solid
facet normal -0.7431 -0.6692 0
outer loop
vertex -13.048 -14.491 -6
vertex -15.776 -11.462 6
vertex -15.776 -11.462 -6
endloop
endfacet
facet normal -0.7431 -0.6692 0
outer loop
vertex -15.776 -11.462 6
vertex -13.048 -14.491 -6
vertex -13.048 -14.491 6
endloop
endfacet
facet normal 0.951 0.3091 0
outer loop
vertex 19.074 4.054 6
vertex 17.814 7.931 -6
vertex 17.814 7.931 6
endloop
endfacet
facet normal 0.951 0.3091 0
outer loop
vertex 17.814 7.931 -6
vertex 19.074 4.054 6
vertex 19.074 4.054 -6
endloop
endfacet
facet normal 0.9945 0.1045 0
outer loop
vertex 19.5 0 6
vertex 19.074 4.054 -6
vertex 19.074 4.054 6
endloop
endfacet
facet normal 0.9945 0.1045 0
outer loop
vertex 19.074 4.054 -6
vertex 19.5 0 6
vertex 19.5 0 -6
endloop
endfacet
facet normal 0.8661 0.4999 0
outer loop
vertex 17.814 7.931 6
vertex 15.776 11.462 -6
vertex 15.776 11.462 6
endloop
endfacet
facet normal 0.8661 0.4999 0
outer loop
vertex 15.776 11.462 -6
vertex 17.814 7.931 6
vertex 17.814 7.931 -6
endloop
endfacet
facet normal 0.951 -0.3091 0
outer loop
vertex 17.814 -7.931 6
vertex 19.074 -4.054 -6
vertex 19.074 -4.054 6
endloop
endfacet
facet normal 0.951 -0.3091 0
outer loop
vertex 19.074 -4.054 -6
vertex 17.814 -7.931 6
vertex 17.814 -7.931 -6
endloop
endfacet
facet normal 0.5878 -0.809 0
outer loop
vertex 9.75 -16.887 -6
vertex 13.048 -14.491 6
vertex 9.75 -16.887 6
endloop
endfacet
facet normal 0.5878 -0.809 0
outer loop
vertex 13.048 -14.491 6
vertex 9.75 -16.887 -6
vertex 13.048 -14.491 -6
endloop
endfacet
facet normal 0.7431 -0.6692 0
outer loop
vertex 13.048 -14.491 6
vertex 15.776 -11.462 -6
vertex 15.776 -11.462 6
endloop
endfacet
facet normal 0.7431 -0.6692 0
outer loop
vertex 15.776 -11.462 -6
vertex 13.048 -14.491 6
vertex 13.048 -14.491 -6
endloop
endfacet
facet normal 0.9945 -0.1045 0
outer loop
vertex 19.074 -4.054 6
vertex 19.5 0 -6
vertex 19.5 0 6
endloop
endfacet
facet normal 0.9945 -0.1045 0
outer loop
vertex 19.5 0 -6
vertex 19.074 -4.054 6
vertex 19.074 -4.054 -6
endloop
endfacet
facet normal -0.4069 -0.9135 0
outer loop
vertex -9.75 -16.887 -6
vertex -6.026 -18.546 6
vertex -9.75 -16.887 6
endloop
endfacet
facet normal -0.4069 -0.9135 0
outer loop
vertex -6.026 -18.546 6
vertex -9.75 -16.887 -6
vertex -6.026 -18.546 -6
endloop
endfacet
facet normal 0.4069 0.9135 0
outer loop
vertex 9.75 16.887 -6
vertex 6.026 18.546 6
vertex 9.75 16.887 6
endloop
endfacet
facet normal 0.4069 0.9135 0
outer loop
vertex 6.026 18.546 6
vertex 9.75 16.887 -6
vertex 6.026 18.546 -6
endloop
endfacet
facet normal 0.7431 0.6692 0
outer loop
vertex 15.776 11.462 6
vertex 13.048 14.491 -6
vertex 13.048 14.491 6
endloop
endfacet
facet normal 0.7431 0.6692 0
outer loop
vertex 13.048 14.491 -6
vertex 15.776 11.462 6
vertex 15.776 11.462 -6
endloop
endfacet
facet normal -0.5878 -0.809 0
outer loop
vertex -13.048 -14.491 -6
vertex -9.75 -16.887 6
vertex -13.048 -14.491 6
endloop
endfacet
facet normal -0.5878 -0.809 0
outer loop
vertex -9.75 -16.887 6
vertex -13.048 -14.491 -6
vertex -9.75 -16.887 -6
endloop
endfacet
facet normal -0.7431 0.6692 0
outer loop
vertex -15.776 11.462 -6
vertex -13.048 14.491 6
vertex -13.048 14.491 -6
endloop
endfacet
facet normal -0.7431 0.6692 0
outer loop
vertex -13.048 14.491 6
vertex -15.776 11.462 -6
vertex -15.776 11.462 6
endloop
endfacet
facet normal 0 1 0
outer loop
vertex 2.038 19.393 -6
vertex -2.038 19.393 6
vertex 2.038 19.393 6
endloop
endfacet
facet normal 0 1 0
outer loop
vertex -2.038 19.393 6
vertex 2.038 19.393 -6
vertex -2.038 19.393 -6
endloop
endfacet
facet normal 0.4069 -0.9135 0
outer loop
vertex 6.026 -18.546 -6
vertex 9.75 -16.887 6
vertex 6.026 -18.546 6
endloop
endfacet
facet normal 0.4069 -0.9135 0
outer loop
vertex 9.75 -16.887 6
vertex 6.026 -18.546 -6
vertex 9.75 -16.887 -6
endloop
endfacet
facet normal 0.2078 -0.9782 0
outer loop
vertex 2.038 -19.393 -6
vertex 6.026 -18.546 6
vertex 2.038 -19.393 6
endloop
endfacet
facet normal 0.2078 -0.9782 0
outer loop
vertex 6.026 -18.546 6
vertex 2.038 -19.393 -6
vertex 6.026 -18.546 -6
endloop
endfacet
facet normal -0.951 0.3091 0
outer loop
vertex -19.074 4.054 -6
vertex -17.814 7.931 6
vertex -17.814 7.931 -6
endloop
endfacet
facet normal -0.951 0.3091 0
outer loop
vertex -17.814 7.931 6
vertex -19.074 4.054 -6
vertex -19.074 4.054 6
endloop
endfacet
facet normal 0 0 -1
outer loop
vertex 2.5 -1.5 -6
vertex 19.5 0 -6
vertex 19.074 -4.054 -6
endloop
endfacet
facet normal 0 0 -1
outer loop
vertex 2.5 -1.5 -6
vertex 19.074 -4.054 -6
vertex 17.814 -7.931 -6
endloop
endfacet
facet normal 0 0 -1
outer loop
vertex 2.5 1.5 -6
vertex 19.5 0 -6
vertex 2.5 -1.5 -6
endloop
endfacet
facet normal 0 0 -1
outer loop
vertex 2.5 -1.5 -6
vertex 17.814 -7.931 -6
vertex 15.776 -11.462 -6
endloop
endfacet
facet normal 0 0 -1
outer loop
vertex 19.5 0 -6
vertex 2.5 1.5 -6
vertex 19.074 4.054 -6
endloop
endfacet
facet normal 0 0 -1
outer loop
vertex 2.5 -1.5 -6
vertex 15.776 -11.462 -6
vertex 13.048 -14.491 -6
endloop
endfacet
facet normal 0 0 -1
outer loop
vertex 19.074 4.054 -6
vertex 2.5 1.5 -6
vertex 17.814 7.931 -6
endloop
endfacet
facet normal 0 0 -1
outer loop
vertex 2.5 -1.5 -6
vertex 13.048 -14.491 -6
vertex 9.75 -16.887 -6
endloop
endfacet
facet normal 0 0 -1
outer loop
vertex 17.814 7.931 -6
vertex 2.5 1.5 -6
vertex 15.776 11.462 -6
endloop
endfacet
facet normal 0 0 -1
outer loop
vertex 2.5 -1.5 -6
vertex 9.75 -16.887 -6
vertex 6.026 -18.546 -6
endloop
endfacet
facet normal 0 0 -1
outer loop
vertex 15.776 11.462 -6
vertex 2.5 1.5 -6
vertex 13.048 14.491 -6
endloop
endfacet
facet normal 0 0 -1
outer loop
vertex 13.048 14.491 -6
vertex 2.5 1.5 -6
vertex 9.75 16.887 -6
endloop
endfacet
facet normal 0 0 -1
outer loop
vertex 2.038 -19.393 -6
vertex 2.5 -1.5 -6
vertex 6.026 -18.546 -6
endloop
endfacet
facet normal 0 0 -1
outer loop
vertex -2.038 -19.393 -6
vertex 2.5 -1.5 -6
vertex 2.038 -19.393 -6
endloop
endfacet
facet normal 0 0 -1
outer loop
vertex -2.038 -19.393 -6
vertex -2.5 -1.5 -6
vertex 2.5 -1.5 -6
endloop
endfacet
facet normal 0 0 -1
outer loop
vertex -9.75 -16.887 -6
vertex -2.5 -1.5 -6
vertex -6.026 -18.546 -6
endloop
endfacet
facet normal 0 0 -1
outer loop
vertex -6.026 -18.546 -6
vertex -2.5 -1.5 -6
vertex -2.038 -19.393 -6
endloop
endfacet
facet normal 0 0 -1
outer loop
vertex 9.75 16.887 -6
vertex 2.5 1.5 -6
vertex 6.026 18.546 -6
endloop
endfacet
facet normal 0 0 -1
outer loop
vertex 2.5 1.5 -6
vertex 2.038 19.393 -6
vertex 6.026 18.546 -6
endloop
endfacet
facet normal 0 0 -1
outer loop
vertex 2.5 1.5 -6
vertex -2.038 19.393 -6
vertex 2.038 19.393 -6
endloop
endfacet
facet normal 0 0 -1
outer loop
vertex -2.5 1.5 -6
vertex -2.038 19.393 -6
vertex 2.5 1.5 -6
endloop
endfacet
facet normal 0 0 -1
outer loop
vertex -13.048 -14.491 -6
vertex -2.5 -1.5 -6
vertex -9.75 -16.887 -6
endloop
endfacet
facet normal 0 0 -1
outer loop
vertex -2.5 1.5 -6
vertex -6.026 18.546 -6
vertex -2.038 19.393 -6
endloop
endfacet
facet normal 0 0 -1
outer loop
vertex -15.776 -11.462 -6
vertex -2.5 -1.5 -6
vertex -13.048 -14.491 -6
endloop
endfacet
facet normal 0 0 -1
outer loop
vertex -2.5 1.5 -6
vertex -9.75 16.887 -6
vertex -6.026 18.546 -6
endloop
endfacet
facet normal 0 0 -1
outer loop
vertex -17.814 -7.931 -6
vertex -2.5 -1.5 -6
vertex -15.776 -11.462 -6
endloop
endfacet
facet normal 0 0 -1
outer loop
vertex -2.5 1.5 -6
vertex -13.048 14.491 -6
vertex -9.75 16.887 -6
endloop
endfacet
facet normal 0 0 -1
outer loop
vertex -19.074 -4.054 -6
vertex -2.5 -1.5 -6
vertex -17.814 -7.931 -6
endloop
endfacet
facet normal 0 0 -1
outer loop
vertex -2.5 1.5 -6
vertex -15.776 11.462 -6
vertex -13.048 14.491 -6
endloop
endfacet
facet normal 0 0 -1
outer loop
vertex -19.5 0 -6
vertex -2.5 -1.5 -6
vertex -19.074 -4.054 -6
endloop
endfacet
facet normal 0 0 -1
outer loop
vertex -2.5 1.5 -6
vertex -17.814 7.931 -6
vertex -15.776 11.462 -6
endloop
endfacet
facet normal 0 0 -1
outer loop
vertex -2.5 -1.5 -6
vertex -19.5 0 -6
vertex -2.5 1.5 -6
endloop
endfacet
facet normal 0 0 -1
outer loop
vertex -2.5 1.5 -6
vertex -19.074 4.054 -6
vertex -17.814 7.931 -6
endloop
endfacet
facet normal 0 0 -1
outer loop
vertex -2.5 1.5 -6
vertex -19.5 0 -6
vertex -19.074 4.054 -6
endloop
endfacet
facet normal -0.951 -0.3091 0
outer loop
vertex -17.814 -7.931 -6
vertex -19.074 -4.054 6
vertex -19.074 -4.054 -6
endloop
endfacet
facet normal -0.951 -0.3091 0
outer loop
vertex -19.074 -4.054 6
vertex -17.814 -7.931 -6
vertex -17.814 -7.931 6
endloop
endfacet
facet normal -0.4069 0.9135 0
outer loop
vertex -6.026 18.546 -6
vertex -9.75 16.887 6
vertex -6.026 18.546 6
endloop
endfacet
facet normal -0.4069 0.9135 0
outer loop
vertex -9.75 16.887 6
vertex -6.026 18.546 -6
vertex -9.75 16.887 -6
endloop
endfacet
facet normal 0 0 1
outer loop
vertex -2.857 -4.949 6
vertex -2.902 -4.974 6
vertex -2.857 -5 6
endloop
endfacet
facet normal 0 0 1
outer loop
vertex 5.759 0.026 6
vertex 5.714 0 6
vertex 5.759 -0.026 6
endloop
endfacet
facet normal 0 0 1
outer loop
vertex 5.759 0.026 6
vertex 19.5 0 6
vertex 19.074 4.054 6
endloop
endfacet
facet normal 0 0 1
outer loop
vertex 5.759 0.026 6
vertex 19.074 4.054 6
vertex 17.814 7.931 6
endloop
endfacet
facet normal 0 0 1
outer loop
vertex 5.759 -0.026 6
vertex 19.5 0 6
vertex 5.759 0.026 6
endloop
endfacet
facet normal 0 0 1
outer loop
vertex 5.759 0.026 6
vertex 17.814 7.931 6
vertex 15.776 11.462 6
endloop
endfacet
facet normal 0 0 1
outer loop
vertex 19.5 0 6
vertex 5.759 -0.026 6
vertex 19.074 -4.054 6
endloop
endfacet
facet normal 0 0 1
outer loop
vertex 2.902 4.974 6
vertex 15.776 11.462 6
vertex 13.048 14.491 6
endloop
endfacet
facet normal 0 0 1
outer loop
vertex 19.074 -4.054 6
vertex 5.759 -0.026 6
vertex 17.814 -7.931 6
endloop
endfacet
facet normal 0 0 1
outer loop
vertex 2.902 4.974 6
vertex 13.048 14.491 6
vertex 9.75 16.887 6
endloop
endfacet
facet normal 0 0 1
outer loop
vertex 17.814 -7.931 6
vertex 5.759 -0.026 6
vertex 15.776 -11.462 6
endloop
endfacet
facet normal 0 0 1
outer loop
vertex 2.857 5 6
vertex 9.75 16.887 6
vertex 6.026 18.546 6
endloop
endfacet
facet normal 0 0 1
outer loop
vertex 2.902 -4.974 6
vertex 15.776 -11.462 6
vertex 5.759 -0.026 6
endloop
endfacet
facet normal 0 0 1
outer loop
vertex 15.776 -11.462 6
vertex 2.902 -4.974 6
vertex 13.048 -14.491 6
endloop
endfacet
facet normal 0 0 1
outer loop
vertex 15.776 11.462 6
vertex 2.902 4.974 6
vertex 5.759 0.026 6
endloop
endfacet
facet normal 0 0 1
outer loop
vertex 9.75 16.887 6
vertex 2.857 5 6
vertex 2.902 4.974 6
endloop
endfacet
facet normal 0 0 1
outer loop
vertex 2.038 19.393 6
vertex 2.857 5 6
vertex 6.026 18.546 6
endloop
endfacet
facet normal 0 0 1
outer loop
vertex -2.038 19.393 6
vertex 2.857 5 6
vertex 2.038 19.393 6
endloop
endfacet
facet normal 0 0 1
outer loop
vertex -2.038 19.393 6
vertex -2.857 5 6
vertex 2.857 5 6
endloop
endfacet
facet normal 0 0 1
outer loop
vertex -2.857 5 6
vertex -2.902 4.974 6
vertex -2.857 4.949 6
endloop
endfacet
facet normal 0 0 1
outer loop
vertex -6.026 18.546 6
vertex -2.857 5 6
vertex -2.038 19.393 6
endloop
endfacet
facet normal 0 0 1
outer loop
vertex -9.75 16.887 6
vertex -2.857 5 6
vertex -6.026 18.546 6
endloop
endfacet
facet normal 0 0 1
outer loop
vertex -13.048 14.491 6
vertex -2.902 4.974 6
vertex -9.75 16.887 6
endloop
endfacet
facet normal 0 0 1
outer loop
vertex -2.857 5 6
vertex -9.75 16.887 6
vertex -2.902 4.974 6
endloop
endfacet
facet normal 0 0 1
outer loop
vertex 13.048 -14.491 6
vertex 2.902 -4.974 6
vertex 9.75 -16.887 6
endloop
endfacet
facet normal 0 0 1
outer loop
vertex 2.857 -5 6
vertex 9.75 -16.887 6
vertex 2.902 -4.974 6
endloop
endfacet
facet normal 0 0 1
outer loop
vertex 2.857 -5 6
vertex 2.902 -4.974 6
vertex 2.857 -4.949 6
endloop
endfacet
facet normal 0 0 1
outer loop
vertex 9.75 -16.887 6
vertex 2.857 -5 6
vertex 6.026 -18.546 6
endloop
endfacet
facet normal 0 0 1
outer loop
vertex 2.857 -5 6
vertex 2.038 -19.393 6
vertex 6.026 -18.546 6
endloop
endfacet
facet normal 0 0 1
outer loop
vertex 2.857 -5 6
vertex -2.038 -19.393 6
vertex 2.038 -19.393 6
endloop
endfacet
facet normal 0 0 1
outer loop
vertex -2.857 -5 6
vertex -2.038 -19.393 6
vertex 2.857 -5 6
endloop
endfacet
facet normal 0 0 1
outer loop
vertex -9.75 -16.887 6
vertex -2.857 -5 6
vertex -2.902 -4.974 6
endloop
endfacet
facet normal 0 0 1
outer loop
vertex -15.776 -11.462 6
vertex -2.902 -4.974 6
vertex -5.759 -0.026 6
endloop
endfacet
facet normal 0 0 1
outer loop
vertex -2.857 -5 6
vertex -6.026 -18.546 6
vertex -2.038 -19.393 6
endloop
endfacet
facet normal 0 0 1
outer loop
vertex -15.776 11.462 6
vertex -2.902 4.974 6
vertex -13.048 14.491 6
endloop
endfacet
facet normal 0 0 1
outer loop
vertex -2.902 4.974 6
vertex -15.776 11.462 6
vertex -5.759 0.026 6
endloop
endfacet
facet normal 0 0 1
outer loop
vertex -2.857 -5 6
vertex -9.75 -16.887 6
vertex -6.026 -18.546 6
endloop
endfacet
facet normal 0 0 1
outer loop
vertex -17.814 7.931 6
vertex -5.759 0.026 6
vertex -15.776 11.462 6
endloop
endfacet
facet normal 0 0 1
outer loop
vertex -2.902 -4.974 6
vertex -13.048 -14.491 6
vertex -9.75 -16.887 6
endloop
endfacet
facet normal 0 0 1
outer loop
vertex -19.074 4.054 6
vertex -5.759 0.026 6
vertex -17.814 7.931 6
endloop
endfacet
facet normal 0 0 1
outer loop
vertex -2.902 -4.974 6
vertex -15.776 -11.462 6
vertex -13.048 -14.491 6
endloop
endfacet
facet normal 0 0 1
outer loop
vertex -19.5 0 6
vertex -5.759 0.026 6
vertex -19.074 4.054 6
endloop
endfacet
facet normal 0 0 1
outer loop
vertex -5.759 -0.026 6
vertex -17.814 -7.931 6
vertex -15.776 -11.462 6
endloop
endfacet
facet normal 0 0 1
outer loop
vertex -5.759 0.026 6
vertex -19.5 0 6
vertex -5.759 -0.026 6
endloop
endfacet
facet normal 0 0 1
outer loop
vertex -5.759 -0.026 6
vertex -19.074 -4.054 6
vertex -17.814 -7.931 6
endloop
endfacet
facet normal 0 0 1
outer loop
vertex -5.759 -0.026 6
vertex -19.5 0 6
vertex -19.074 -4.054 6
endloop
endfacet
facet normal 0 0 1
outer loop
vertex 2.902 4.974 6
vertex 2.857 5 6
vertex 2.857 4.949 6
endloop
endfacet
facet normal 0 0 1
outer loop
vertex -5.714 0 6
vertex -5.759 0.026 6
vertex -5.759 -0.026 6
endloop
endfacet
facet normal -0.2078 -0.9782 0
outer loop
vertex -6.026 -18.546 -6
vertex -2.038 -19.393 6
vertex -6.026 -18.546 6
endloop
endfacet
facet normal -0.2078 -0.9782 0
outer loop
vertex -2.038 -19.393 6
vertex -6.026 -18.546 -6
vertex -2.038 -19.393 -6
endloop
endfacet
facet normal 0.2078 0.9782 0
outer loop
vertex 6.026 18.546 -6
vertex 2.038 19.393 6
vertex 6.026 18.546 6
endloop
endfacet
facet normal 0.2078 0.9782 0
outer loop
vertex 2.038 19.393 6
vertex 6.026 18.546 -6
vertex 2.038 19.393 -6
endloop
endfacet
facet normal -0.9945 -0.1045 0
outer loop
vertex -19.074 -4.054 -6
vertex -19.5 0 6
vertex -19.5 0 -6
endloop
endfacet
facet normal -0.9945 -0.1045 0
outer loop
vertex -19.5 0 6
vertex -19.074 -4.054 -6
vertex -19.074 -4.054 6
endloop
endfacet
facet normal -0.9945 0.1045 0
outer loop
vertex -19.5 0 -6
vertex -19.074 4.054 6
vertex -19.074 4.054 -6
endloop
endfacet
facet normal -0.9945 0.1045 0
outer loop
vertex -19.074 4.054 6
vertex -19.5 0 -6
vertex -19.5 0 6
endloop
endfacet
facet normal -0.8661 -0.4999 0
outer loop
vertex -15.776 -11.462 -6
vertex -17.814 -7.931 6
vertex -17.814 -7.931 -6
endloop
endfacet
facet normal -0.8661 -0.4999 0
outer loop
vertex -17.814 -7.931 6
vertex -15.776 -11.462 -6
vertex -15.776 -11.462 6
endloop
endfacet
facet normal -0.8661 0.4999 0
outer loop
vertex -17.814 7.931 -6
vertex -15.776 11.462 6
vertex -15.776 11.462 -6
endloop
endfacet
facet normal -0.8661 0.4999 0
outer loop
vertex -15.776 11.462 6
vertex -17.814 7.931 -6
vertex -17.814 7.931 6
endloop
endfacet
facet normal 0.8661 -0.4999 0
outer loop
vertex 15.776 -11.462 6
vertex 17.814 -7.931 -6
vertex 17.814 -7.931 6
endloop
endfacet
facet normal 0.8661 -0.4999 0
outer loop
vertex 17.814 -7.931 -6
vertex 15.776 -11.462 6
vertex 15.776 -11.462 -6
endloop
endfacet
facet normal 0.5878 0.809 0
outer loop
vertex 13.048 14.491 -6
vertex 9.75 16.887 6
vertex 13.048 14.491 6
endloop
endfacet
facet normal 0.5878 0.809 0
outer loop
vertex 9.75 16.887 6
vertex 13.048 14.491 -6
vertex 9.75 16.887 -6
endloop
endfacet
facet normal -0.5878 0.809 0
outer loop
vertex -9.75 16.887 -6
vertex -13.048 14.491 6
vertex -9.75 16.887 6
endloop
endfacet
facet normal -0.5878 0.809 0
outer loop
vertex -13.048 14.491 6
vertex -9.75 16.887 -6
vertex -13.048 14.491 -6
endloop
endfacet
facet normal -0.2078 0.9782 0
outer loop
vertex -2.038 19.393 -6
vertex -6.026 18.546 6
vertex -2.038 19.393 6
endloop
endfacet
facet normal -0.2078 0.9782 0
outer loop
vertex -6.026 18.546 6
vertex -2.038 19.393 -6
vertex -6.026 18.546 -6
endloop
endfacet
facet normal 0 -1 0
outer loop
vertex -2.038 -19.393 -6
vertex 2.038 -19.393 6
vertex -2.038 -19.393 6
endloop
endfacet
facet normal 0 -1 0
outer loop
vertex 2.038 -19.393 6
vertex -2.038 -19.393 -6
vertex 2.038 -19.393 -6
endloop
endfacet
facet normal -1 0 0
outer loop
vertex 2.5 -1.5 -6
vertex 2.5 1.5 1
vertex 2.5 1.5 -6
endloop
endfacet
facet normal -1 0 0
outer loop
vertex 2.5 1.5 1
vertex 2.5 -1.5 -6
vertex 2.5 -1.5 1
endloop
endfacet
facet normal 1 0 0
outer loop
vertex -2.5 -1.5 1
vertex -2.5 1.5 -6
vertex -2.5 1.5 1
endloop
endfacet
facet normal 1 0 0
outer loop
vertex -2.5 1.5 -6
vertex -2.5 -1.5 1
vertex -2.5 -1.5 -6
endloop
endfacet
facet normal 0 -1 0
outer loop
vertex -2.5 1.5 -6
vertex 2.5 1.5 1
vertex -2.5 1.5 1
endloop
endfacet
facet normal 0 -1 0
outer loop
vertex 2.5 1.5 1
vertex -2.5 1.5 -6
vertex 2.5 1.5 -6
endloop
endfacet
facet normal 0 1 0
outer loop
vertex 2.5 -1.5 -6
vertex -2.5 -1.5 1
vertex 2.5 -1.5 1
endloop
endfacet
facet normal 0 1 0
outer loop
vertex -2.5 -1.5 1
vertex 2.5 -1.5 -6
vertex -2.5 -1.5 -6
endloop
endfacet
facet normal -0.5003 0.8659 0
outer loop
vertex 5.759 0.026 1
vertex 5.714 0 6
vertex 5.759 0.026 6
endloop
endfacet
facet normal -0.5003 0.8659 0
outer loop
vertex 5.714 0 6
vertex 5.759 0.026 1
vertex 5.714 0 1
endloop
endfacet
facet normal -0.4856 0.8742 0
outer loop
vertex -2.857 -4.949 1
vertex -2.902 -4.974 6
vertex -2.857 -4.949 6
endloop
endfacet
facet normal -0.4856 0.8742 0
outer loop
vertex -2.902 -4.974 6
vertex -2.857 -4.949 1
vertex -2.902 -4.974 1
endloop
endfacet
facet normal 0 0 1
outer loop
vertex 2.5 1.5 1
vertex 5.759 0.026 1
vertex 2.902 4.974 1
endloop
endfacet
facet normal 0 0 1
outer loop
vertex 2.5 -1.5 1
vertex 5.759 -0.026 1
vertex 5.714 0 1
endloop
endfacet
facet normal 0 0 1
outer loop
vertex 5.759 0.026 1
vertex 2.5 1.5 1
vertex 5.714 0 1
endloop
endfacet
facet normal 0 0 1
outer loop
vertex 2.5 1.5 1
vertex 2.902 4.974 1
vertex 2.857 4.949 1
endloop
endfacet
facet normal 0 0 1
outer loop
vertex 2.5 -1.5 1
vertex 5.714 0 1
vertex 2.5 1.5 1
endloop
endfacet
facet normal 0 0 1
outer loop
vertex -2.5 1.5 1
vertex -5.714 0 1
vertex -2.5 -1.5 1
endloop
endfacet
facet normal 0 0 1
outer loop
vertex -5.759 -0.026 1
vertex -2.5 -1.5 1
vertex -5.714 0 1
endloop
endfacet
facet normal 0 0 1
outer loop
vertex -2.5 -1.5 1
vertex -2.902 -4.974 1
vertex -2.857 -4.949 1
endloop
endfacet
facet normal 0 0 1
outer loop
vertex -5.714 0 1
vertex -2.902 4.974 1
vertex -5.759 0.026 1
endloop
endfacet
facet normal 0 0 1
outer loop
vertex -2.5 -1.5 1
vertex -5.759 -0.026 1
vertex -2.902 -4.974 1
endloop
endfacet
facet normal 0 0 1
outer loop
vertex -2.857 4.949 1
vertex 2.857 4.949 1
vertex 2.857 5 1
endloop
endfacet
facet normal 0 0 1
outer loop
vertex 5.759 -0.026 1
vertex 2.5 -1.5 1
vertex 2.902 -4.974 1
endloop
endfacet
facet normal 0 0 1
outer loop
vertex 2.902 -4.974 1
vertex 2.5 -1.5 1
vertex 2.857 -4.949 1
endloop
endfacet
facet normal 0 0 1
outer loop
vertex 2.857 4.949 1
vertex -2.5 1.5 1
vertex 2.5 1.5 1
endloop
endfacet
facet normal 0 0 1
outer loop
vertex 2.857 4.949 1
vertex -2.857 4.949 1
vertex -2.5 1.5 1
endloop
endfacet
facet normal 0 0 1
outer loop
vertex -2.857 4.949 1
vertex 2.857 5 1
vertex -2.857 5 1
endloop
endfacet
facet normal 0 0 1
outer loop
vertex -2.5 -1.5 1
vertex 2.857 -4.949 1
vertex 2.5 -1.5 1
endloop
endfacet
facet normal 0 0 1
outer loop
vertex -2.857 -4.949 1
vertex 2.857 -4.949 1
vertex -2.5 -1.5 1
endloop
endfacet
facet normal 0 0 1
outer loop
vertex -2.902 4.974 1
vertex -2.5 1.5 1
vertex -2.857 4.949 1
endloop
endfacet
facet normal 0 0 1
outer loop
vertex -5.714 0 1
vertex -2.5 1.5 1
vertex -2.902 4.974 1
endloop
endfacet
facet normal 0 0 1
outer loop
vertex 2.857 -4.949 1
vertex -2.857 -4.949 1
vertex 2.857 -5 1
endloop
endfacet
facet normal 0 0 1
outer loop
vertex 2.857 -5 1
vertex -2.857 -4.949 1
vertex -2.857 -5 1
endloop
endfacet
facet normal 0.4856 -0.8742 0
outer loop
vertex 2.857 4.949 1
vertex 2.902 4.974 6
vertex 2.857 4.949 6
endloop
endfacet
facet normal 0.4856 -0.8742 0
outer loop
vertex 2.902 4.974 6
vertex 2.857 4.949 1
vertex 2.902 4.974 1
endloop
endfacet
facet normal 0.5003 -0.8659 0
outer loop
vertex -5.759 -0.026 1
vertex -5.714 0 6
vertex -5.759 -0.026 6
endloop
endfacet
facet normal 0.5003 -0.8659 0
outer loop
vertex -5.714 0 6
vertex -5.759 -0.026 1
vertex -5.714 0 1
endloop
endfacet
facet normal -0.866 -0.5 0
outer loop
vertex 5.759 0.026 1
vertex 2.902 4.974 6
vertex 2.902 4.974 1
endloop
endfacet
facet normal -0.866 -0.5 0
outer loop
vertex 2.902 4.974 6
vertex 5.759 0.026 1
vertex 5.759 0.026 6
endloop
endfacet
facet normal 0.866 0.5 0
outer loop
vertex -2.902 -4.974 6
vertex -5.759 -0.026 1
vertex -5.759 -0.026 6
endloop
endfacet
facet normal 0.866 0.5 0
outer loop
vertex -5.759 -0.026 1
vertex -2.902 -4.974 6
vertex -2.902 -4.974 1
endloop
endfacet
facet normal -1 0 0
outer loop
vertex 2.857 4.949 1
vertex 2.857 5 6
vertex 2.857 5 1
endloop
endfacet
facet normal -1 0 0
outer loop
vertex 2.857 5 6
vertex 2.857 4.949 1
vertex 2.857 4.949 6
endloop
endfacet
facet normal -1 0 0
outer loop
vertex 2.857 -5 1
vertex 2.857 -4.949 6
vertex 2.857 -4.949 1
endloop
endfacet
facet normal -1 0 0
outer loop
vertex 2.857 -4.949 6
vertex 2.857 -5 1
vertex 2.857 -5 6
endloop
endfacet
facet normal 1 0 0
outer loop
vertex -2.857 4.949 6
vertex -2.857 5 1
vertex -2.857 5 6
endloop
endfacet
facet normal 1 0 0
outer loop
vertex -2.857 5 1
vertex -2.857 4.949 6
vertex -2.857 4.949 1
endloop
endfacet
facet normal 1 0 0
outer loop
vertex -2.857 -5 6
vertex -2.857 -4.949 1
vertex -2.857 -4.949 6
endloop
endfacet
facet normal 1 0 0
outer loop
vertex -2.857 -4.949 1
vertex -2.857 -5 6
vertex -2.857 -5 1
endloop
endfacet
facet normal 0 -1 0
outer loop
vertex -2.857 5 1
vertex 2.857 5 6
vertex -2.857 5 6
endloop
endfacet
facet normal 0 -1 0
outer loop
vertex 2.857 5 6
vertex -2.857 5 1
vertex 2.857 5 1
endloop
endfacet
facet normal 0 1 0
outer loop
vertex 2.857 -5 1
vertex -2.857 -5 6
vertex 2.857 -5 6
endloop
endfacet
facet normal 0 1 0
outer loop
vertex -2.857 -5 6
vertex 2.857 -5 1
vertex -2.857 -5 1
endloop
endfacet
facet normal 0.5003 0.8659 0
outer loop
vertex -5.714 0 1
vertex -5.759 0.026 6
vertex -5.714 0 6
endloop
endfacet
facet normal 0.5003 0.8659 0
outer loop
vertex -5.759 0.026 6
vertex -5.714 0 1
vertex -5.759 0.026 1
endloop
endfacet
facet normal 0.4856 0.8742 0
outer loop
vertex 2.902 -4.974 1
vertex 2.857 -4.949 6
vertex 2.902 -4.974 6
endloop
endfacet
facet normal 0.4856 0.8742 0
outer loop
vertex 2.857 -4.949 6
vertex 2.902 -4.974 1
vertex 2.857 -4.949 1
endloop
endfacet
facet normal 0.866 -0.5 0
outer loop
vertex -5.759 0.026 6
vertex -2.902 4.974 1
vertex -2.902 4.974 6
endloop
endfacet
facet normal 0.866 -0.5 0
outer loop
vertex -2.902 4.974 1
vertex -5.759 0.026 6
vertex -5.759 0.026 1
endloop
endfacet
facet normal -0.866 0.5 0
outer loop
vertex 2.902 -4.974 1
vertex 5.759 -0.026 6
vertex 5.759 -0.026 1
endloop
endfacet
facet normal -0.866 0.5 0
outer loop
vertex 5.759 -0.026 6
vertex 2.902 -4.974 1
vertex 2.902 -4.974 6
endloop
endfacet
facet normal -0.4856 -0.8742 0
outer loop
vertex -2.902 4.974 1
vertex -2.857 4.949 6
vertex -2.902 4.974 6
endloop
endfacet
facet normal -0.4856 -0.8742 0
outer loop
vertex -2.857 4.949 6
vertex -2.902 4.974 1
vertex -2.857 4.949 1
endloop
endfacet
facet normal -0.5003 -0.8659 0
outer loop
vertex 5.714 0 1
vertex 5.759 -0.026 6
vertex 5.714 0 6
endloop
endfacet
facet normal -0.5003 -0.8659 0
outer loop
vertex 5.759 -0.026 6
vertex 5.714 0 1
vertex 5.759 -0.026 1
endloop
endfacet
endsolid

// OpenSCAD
module example002()
{
	difference(){
	difference(){
		cylinder(h = 12, r1 = 19.5, r2 = 19.5, center = true);
		translate([0,0,-6]){
		cube([5,3,15], center = true);
		}
	}
	translate([0,0,4]){
		//cylinder(h = 6, r1=7, r2=7, center = true);
		hexagon(10, 6);
	}
	}
	
}

module hexagon(size, height) {
  boxWidth = size/1.75;
  for (r = [-60, 0, 60]) rotate([0,0,r]) cube([boxWidth, size, height], true);
}

example002();
